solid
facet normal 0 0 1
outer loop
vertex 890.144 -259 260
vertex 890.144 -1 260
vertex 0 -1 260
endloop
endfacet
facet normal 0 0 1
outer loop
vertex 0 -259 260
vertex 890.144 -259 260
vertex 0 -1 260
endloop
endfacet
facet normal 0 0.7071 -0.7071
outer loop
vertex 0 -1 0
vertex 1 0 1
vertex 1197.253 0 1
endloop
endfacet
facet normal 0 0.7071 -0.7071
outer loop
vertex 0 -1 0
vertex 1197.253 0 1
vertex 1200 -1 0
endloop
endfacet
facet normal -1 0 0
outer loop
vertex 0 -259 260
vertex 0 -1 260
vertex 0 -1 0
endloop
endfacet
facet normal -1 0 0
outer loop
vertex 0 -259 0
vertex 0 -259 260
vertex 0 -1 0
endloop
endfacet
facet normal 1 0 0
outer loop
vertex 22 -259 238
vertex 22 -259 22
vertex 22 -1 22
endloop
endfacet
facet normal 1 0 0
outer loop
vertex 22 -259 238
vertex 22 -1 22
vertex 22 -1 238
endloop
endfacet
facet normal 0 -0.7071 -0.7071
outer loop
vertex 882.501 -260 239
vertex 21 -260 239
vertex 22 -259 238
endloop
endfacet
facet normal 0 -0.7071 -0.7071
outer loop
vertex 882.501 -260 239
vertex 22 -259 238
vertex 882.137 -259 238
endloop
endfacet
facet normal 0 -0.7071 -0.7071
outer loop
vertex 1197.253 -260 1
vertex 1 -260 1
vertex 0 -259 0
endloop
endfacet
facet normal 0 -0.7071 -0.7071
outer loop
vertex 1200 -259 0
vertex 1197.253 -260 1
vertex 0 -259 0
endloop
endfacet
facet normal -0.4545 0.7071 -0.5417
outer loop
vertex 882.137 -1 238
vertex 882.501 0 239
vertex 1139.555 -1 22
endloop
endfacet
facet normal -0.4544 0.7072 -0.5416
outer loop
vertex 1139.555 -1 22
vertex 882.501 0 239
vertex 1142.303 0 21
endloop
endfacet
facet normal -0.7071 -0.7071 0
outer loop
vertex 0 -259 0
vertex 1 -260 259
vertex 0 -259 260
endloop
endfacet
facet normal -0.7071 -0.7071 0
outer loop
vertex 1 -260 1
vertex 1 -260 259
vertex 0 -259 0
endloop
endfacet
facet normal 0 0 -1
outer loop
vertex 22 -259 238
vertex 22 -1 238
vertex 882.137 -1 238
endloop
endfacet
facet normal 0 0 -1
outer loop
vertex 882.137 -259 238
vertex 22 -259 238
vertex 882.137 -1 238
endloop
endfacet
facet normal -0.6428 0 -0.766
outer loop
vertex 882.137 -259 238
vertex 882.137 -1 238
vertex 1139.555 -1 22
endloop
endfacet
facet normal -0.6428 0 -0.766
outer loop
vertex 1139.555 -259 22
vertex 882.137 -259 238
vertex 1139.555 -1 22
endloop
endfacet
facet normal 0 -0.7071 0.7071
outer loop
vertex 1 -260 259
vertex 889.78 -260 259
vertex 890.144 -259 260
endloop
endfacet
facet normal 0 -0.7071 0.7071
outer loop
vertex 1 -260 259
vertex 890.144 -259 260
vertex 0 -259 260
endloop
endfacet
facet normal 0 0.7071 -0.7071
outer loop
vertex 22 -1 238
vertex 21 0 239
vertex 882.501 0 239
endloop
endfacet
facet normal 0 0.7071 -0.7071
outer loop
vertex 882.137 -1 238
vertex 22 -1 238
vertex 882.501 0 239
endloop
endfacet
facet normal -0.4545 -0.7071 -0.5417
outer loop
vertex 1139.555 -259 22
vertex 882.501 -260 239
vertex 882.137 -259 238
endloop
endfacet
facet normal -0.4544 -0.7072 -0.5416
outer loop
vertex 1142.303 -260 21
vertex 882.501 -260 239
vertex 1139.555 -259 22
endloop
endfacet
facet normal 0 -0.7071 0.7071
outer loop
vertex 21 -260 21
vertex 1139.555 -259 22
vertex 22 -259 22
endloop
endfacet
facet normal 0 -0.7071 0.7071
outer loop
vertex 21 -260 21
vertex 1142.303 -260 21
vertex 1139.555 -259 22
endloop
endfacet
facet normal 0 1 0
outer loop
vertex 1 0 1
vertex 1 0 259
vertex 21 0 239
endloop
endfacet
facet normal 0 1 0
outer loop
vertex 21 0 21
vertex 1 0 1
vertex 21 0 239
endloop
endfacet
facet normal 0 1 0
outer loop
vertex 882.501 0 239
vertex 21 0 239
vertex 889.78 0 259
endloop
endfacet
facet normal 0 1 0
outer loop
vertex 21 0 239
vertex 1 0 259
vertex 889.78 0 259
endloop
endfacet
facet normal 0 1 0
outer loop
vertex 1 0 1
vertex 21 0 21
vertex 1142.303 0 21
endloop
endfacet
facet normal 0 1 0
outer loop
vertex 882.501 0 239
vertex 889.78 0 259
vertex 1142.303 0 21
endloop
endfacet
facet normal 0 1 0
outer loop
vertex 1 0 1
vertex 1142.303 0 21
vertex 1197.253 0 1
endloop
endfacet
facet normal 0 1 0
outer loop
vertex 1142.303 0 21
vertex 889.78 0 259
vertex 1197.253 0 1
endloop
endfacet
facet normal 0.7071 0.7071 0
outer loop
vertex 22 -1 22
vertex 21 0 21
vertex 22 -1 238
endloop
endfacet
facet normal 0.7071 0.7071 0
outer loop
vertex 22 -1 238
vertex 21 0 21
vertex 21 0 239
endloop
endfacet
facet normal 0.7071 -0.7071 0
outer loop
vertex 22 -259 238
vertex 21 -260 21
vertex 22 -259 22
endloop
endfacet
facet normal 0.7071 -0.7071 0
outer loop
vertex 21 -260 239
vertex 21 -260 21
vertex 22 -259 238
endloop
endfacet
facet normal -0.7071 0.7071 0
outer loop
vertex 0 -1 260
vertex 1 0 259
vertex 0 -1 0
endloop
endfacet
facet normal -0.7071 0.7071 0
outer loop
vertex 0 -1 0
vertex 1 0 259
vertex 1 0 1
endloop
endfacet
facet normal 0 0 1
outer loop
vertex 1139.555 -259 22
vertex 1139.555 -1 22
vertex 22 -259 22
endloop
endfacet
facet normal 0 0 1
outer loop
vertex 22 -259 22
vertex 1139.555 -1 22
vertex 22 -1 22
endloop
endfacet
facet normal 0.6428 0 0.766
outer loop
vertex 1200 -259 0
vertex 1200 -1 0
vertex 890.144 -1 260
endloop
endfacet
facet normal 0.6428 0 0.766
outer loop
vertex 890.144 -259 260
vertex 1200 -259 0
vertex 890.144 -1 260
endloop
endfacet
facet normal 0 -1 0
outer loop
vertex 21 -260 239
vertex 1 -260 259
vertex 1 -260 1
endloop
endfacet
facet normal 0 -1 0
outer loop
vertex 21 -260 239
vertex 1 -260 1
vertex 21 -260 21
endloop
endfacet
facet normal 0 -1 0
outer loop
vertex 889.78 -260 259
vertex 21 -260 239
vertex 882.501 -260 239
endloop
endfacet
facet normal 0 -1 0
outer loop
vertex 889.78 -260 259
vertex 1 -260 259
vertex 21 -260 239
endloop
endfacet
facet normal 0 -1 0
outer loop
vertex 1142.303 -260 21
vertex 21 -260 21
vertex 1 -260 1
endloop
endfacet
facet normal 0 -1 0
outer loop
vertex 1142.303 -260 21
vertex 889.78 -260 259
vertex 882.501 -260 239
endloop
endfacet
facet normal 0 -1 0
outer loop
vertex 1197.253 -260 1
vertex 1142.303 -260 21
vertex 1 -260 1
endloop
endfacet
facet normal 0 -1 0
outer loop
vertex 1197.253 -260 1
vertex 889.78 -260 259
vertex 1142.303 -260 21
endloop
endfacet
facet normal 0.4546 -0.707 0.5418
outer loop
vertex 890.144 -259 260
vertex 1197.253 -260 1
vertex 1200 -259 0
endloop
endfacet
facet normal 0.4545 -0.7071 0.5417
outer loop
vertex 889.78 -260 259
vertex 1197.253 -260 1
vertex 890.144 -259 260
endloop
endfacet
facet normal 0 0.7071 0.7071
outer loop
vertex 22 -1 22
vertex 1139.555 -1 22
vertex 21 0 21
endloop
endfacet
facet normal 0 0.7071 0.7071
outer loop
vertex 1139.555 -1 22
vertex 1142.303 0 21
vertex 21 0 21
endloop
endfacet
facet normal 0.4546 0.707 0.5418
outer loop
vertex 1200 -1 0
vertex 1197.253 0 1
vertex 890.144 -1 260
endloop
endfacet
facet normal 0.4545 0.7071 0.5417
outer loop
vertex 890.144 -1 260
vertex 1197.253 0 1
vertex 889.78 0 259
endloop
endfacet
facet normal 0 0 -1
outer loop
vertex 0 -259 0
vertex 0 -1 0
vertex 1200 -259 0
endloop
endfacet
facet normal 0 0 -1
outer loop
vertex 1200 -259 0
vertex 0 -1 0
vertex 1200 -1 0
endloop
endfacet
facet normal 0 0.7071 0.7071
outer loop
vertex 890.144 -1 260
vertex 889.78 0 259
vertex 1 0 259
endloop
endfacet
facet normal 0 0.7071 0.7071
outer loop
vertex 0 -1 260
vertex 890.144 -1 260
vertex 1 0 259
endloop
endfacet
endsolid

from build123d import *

# Parameters (mm, degrees)
F1_DEPTH = 260
F2_SIZE  = 1


with BuildPart() as f1:
    # F0 (on Front) → F1 (new body)
    with BuildSketch(Plane.XZ):
        Polygon((0, 260), (0, 0), (1200, 0), (890.144066, 260), align=None)
        Polygon((22, 22), (22, 238), (882.136721, 238), (1139.555497, 22), align=None, mode=Mode.SUBTRACT)
    extrude(amount=F1_DEPTH)

    # F2
    f2_edges = [f1.edges().sort_by_distance(p)[0] for p in [
        (445.072033, -260, 260),
        (452.06836, -260, 238),
        (580.777748, -260, 22),
        (600, -260, 0),
        (0, -260, 130),
        (22, -260, 130),
        (1045.072033, -260, 130),
        (1010.846109, -260, 130),
        (580.777748, 0, 22),
        (445.072033, 0, 260),
        (1045.072033, 0, 130),
        (1010.846109, 0, 130),
        (452.06836, 0, 238),
        (0, 0, 130),
        (22, 0, 130),
        (600, 0, 0),
    ]]
    chamfer(f2_edges, length=F2_SIZE)


solid = f1.part
